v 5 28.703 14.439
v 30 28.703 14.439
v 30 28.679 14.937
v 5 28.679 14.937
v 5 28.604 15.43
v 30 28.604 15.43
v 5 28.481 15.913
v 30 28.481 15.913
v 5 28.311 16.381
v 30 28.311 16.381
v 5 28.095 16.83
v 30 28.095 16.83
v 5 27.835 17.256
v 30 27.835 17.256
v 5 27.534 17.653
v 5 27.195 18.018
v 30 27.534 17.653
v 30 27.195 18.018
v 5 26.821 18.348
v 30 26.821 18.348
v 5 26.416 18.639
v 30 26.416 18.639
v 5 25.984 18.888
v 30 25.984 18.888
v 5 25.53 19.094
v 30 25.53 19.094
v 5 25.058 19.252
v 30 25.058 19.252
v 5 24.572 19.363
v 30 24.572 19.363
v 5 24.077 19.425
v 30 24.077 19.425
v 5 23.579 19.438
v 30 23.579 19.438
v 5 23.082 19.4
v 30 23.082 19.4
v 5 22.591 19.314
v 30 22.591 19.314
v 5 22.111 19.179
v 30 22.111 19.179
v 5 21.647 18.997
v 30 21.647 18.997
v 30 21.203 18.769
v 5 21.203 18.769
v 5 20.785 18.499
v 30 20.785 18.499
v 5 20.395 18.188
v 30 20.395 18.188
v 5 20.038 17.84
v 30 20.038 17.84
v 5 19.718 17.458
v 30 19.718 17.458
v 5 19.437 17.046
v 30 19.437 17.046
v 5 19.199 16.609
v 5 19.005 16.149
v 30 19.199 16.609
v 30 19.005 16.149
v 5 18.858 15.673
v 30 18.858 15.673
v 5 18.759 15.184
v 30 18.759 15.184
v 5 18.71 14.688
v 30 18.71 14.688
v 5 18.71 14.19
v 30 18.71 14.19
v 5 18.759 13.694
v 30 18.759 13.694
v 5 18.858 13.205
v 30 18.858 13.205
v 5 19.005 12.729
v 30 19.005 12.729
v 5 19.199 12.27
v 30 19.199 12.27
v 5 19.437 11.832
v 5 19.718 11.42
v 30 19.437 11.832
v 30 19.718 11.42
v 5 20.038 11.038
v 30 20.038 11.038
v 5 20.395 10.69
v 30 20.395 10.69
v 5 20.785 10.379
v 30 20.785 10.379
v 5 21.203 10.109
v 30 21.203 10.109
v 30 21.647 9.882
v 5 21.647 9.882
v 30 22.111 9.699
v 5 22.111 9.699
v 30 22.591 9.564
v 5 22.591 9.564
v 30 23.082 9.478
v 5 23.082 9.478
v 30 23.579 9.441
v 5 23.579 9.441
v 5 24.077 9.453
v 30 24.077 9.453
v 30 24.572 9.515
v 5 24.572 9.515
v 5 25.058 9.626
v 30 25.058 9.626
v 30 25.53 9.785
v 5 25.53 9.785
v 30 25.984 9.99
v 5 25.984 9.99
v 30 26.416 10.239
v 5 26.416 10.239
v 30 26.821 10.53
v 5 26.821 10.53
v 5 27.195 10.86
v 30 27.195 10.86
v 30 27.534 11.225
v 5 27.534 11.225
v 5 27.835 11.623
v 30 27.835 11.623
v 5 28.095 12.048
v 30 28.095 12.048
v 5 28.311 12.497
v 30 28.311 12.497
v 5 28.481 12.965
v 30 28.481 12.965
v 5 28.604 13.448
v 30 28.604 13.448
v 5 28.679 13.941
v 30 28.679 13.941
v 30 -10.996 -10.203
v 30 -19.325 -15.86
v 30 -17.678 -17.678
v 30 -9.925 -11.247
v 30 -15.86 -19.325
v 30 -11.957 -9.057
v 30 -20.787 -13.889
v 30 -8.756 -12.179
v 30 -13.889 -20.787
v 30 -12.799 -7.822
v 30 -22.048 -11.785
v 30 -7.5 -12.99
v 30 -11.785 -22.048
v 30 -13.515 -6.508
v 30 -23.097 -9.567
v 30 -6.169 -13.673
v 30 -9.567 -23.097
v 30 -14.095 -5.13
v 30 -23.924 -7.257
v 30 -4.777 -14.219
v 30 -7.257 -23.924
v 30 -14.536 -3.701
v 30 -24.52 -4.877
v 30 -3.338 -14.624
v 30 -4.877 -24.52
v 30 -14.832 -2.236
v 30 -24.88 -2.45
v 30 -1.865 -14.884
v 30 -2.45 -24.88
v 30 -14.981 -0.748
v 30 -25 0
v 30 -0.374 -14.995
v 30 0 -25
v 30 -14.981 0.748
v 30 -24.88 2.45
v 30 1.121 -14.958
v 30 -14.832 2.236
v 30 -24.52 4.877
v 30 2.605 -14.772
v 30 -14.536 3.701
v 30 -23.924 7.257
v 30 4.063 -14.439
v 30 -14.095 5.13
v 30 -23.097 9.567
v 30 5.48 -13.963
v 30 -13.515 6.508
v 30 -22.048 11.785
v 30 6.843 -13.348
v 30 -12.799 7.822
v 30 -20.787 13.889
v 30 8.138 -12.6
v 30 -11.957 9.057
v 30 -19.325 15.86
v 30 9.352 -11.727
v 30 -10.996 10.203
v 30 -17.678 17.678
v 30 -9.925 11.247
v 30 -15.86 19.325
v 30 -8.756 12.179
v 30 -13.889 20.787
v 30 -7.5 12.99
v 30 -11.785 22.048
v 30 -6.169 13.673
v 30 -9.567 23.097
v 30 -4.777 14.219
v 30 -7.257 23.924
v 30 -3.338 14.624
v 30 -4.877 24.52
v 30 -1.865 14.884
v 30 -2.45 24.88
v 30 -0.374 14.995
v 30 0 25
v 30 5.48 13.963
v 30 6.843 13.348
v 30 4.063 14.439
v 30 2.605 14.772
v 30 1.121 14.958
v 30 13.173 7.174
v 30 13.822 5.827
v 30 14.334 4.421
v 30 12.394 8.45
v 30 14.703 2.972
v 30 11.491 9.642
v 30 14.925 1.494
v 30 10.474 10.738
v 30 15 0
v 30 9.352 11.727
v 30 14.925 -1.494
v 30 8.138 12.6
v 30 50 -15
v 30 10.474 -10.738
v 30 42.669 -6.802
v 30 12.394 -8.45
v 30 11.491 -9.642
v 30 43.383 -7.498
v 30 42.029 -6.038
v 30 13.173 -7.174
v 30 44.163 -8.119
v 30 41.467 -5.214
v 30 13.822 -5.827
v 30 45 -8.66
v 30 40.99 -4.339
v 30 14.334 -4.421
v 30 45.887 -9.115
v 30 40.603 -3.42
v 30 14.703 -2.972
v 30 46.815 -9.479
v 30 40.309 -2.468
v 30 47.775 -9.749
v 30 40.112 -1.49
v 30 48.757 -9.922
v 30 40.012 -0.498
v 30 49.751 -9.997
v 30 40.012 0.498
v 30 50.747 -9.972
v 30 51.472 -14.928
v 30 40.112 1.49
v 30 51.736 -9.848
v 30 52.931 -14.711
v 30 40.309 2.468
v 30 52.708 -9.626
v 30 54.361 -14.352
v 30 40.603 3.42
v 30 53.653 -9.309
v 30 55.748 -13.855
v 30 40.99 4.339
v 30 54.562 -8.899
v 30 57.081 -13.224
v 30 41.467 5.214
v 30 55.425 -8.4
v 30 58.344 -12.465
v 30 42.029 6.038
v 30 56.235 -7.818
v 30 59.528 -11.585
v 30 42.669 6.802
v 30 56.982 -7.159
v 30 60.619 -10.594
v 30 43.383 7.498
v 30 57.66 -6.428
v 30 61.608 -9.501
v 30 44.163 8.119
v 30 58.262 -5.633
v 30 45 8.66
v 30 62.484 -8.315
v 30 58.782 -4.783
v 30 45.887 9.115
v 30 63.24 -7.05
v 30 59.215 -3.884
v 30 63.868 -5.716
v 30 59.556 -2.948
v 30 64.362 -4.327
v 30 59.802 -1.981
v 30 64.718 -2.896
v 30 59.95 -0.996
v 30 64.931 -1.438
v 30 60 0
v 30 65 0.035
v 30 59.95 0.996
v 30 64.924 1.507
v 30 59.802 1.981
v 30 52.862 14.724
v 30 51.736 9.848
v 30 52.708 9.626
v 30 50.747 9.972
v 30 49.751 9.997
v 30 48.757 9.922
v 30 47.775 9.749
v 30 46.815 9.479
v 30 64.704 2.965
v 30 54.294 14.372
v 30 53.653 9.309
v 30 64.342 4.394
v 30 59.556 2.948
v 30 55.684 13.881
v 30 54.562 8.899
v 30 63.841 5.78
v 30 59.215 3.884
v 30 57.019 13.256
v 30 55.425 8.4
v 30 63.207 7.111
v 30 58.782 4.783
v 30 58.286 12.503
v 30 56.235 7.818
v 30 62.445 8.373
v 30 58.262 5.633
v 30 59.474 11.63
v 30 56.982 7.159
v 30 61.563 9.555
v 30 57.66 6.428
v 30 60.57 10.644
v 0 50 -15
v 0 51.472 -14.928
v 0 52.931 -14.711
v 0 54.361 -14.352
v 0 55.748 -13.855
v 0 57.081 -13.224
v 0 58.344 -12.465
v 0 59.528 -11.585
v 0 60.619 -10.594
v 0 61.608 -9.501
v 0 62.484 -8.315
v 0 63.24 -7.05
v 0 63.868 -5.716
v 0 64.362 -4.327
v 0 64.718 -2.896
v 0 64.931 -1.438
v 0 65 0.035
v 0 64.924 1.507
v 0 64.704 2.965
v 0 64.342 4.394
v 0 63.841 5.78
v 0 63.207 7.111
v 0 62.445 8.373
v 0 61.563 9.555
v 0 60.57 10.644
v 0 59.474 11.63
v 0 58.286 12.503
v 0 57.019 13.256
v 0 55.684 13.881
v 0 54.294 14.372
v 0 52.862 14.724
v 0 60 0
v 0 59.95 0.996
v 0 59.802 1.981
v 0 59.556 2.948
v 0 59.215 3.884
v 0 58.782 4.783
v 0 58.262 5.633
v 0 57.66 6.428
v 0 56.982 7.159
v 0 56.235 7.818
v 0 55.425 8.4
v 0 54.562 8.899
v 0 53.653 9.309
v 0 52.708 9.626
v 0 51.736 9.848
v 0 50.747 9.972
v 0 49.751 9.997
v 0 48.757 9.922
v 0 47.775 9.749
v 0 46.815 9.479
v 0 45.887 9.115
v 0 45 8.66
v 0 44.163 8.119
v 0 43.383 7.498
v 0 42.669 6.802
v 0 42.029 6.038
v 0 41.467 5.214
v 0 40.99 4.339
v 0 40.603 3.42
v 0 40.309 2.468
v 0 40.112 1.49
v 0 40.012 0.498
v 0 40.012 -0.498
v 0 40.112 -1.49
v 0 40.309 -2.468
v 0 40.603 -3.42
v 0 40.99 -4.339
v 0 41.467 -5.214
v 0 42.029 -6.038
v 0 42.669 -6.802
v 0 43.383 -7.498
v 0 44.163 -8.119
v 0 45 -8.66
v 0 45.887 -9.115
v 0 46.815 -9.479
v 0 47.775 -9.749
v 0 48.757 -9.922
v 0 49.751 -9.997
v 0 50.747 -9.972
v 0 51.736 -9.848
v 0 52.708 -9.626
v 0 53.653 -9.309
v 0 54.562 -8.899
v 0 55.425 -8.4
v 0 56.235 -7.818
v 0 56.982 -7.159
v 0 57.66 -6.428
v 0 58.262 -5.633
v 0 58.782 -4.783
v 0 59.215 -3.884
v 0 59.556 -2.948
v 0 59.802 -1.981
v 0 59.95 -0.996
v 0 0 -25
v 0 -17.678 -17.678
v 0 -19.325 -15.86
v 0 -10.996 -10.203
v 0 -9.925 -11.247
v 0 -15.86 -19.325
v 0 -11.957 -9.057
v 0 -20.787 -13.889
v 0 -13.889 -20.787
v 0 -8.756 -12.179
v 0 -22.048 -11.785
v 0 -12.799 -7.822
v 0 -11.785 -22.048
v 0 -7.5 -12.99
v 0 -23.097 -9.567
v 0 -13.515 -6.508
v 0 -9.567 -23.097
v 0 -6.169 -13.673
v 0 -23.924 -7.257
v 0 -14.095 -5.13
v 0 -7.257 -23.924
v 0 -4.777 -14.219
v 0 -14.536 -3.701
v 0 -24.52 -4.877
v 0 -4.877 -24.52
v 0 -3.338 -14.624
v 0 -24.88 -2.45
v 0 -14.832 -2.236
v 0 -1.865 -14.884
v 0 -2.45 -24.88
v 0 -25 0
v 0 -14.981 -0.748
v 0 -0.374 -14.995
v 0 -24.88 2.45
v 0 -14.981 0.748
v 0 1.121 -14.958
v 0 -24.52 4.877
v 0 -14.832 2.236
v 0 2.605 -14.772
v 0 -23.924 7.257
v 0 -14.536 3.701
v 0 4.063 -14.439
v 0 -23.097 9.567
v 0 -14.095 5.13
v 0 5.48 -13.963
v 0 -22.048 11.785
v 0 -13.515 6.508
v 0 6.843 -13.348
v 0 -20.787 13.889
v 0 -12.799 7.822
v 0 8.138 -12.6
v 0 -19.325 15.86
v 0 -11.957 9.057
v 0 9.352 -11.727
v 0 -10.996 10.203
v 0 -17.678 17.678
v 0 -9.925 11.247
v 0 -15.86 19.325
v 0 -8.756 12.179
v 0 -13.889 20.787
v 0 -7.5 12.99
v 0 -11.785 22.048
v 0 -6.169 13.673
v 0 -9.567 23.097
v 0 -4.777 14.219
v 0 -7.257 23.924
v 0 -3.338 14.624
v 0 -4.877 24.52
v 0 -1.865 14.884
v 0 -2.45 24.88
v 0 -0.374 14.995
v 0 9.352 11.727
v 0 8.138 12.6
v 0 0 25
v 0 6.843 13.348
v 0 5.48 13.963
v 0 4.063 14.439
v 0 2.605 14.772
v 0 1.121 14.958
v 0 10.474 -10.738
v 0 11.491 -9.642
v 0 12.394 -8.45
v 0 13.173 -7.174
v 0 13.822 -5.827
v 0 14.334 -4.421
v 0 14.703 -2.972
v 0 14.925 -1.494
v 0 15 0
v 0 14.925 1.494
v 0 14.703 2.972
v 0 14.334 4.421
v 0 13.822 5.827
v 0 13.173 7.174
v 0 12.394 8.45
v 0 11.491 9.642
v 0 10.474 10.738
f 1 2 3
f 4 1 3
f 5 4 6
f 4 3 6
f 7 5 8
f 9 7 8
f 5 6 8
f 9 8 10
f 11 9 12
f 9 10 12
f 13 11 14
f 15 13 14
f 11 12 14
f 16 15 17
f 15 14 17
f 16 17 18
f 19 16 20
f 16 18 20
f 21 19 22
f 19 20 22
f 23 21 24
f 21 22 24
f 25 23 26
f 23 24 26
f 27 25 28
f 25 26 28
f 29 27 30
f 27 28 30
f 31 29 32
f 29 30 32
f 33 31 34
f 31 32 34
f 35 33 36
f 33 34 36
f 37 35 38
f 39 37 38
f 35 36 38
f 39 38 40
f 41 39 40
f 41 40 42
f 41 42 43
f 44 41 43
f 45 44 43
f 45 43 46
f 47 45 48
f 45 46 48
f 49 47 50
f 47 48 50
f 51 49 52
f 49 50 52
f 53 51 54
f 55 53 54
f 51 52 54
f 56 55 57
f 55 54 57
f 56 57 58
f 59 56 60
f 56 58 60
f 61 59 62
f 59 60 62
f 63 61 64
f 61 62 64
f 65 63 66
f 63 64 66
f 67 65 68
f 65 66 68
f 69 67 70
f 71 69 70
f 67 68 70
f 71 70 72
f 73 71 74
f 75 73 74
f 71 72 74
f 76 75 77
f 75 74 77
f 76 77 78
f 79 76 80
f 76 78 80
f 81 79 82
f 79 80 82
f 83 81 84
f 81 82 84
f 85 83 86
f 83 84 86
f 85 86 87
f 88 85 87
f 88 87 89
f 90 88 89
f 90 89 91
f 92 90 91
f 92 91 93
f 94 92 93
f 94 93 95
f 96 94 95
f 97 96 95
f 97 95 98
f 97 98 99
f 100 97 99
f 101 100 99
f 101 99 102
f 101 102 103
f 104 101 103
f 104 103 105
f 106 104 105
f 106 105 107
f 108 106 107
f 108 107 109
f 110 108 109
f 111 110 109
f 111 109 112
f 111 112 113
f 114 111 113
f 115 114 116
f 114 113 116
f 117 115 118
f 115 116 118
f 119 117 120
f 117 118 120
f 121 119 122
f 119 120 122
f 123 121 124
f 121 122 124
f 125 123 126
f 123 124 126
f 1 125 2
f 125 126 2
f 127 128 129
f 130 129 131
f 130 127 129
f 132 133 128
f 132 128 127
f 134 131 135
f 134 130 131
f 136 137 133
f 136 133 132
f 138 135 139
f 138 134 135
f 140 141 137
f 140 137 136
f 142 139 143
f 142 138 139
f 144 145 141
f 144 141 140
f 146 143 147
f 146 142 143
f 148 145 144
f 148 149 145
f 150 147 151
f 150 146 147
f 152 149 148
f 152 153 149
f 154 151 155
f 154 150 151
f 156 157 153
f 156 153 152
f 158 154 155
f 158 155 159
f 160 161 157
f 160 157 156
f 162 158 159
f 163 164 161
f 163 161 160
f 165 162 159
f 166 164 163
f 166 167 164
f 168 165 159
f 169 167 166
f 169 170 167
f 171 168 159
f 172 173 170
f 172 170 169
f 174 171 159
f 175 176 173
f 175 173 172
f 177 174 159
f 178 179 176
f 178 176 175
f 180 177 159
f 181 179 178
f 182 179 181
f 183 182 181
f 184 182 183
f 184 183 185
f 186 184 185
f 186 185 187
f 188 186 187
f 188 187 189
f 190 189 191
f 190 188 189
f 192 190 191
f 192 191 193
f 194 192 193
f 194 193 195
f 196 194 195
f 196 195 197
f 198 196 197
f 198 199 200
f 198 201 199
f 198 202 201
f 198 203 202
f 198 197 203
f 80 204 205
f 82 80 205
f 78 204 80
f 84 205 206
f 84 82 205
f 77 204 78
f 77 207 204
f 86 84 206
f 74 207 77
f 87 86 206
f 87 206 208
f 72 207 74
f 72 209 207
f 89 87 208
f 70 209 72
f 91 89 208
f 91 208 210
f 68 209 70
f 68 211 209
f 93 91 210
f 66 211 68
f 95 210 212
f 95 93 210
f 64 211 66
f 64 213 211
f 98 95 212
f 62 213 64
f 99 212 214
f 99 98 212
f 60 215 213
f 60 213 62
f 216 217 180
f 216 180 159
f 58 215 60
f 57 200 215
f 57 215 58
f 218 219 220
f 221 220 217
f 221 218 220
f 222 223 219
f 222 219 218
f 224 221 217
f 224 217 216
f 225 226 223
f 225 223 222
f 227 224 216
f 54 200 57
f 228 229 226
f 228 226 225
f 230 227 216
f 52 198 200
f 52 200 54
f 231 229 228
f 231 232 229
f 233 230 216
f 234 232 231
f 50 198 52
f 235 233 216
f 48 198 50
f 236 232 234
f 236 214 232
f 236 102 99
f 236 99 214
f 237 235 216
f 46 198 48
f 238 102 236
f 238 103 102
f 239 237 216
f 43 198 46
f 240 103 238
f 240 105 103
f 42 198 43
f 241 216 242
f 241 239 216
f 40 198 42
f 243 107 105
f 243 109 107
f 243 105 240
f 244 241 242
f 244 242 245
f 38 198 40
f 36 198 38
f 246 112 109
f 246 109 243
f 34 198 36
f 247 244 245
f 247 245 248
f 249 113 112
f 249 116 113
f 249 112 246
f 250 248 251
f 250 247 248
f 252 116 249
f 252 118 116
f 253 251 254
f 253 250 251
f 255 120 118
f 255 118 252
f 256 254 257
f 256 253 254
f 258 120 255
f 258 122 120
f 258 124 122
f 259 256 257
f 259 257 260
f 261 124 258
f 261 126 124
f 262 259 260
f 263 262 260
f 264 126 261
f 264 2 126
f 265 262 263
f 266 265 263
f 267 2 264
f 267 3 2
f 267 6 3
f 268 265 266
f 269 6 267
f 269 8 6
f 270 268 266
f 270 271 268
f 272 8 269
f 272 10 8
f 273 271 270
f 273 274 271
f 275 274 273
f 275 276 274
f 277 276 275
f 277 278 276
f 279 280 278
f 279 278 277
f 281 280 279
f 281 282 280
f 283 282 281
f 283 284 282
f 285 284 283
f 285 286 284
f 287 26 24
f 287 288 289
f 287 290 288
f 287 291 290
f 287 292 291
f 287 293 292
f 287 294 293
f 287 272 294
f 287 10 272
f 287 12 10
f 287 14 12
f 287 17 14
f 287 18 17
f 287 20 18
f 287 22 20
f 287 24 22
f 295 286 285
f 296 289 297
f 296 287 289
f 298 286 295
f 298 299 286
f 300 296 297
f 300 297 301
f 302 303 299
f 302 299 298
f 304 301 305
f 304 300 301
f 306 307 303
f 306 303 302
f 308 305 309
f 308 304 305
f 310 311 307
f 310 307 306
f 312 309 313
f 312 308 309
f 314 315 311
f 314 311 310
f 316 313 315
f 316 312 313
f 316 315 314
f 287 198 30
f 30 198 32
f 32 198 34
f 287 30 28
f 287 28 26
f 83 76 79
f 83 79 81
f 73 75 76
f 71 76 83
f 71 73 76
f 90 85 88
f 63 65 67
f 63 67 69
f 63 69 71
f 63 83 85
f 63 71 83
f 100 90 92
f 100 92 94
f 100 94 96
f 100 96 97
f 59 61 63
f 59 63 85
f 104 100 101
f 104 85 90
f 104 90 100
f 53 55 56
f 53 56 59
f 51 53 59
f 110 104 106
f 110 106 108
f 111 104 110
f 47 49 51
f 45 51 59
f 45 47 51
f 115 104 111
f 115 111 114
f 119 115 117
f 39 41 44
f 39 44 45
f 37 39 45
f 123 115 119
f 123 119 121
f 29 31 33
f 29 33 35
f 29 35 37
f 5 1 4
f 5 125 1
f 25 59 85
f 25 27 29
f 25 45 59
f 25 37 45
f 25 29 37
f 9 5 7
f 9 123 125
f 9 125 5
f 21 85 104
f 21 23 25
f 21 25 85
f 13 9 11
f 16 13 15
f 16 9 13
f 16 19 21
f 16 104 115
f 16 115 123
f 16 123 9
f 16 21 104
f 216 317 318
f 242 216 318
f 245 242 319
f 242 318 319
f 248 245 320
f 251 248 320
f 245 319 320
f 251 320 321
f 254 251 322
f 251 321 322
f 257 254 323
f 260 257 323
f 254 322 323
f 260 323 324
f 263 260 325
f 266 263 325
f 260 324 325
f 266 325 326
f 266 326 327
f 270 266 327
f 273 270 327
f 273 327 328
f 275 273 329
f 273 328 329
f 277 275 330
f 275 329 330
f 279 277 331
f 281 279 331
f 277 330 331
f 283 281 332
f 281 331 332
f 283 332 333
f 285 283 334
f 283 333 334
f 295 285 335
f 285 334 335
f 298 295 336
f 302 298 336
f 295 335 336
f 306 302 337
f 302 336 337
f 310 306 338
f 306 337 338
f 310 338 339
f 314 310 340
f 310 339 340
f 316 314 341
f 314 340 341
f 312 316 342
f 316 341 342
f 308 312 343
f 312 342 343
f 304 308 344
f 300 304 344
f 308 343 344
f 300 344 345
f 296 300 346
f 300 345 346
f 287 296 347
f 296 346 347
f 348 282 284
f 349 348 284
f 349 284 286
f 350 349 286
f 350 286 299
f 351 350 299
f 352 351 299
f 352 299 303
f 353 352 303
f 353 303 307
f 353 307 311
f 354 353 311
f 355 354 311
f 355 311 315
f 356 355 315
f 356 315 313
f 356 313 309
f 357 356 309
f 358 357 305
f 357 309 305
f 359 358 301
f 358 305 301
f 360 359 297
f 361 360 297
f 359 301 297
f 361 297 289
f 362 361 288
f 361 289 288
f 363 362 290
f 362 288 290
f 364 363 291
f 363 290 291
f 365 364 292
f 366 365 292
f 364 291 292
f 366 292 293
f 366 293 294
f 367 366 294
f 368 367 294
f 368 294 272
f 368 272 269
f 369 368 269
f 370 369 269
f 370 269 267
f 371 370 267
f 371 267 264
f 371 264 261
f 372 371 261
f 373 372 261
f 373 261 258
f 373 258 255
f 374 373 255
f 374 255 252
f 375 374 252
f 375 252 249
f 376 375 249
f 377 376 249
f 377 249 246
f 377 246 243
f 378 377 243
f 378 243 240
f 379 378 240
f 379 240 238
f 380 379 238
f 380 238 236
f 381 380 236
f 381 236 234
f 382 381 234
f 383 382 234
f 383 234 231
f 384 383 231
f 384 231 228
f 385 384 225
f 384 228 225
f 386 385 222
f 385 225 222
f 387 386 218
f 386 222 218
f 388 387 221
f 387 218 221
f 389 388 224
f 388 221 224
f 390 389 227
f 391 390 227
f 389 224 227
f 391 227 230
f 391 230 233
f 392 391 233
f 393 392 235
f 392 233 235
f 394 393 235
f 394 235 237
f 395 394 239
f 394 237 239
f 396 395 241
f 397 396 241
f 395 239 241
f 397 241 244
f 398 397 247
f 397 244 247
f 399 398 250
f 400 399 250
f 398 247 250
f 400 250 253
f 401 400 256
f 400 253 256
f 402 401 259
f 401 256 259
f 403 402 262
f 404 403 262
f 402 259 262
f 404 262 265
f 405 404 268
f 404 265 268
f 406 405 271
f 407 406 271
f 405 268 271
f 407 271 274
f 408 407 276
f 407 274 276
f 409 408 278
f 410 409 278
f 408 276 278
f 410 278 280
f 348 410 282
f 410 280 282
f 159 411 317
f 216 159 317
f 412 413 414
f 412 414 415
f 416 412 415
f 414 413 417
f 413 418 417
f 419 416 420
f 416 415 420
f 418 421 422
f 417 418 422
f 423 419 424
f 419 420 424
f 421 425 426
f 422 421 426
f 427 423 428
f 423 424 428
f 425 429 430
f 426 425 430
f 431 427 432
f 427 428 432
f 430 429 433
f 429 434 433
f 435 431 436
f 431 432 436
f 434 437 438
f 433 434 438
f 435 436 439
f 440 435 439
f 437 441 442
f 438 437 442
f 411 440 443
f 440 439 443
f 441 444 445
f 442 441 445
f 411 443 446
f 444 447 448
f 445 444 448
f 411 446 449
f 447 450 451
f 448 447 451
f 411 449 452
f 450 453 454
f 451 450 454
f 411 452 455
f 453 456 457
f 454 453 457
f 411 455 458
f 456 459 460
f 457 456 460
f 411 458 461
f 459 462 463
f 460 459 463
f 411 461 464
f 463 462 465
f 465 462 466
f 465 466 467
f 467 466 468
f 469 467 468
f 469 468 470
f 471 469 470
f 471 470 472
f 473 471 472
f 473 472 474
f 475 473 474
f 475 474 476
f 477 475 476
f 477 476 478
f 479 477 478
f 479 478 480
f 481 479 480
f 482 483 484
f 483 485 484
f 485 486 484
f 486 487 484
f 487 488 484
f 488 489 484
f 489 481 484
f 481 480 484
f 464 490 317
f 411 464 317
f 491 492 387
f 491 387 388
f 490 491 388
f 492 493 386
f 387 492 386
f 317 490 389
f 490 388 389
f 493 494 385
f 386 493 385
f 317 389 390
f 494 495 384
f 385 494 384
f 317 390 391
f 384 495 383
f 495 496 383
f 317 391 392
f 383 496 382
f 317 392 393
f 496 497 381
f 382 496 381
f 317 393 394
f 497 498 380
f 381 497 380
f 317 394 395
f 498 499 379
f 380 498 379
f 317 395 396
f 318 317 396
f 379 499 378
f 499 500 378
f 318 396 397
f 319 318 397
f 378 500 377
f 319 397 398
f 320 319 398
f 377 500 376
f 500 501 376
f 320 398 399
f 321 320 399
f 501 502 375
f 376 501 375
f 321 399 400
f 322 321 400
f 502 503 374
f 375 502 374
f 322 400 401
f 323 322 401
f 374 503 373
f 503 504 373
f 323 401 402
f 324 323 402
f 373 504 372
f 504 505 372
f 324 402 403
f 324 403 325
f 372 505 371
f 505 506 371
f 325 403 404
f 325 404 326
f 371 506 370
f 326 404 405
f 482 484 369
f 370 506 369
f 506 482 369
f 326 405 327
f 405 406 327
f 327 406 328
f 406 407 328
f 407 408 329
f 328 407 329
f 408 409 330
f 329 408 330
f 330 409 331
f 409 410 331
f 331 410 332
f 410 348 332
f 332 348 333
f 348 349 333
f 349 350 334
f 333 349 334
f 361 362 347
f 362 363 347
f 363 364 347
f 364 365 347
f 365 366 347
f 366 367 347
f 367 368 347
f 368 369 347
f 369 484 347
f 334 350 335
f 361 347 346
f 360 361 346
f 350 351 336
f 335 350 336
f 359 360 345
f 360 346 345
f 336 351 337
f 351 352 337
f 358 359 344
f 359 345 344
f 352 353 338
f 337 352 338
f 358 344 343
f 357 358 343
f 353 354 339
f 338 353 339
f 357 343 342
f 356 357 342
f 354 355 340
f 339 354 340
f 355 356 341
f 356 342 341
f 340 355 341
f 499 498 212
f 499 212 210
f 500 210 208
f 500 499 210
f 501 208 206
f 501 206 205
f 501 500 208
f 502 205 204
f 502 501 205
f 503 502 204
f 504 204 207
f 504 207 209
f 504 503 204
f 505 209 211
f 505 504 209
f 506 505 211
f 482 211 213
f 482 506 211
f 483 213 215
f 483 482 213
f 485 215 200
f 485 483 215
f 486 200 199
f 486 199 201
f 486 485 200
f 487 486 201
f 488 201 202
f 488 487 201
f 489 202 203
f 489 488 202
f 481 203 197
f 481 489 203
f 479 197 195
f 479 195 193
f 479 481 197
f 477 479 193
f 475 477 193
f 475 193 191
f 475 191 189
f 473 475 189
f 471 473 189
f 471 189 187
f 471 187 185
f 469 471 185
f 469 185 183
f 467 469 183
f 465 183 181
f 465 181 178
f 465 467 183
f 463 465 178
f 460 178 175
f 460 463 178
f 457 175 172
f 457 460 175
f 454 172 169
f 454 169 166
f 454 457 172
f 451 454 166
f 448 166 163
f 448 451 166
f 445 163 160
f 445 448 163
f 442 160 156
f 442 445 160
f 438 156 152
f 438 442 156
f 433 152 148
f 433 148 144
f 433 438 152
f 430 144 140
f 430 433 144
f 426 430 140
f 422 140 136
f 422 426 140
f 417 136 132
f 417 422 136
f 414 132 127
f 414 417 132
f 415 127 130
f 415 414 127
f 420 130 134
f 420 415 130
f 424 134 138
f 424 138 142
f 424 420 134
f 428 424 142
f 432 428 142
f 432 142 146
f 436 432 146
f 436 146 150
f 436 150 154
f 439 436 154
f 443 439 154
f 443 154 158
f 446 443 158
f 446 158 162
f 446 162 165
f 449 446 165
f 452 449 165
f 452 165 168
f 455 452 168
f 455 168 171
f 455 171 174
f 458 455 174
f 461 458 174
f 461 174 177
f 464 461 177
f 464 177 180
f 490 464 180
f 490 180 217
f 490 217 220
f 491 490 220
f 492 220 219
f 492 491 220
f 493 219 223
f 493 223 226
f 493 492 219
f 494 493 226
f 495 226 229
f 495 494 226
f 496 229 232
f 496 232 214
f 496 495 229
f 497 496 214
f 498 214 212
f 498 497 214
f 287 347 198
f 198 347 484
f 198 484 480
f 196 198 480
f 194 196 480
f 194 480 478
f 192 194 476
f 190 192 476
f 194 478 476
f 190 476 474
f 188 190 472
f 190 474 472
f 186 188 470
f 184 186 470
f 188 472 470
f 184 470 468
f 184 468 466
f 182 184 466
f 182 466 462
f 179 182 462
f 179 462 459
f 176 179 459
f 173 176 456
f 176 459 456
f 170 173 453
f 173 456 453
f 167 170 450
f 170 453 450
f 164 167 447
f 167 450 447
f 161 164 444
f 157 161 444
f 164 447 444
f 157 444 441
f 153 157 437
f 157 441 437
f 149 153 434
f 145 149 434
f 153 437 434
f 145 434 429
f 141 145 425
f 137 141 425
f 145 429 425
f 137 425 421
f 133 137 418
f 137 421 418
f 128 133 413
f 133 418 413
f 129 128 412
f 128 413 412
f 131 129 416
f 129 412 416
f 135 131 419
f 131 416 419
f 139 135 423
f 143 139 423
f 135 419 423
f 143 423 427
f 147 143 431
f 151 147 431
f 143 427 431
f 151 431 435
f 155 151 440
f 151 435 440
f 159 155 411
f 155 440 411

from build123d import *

# Parameters (mm, degrees)
F0_R     = 15
F1_DEPTH = 30
F2_R     = 10
F3_DEPTH = 30.001
F4_R     = 5
F5_DEPTH = 25


with BuildPart() as f1:
    # F0 (on Right) → F1 (new body)
    with BuildSketch(Plane.YZ):
        with BuildLine():
            Line((52.862198, 14.724396), (0, 25))
            ThreePointArc((0, 25), (-25, 0), (0, -25))
            Line((0, -25), (50, -15))
            ThreePointArc((50, -15), (64.93094, -1.437718), (52.862198, 14.724396))
        make_face()
        Circle(F0_R, mode=Mode.SUBTRACT)
    extrude(amount=F1_DEPTH)

    # F2 (on face) → F3 (cut, through all)
    with BuildSketch(Plane.YZ.offset(30)):
        with Locations((50, 0)):
            Circle(F2_R)
    extrude(amount=-F3_DEPTH, mode=Mode.SUBTRACT)

    # F4 (on face) → F5 (cut)
    with BuildSketch(Plane.YZ.offset(30)):
        with Locations((23.703395, 14.439134)):
            Circle(F4_R)
    extrude(amount=-F5_DEPTH, mode=Mode.SUBTRACT)


solid = f1.part
